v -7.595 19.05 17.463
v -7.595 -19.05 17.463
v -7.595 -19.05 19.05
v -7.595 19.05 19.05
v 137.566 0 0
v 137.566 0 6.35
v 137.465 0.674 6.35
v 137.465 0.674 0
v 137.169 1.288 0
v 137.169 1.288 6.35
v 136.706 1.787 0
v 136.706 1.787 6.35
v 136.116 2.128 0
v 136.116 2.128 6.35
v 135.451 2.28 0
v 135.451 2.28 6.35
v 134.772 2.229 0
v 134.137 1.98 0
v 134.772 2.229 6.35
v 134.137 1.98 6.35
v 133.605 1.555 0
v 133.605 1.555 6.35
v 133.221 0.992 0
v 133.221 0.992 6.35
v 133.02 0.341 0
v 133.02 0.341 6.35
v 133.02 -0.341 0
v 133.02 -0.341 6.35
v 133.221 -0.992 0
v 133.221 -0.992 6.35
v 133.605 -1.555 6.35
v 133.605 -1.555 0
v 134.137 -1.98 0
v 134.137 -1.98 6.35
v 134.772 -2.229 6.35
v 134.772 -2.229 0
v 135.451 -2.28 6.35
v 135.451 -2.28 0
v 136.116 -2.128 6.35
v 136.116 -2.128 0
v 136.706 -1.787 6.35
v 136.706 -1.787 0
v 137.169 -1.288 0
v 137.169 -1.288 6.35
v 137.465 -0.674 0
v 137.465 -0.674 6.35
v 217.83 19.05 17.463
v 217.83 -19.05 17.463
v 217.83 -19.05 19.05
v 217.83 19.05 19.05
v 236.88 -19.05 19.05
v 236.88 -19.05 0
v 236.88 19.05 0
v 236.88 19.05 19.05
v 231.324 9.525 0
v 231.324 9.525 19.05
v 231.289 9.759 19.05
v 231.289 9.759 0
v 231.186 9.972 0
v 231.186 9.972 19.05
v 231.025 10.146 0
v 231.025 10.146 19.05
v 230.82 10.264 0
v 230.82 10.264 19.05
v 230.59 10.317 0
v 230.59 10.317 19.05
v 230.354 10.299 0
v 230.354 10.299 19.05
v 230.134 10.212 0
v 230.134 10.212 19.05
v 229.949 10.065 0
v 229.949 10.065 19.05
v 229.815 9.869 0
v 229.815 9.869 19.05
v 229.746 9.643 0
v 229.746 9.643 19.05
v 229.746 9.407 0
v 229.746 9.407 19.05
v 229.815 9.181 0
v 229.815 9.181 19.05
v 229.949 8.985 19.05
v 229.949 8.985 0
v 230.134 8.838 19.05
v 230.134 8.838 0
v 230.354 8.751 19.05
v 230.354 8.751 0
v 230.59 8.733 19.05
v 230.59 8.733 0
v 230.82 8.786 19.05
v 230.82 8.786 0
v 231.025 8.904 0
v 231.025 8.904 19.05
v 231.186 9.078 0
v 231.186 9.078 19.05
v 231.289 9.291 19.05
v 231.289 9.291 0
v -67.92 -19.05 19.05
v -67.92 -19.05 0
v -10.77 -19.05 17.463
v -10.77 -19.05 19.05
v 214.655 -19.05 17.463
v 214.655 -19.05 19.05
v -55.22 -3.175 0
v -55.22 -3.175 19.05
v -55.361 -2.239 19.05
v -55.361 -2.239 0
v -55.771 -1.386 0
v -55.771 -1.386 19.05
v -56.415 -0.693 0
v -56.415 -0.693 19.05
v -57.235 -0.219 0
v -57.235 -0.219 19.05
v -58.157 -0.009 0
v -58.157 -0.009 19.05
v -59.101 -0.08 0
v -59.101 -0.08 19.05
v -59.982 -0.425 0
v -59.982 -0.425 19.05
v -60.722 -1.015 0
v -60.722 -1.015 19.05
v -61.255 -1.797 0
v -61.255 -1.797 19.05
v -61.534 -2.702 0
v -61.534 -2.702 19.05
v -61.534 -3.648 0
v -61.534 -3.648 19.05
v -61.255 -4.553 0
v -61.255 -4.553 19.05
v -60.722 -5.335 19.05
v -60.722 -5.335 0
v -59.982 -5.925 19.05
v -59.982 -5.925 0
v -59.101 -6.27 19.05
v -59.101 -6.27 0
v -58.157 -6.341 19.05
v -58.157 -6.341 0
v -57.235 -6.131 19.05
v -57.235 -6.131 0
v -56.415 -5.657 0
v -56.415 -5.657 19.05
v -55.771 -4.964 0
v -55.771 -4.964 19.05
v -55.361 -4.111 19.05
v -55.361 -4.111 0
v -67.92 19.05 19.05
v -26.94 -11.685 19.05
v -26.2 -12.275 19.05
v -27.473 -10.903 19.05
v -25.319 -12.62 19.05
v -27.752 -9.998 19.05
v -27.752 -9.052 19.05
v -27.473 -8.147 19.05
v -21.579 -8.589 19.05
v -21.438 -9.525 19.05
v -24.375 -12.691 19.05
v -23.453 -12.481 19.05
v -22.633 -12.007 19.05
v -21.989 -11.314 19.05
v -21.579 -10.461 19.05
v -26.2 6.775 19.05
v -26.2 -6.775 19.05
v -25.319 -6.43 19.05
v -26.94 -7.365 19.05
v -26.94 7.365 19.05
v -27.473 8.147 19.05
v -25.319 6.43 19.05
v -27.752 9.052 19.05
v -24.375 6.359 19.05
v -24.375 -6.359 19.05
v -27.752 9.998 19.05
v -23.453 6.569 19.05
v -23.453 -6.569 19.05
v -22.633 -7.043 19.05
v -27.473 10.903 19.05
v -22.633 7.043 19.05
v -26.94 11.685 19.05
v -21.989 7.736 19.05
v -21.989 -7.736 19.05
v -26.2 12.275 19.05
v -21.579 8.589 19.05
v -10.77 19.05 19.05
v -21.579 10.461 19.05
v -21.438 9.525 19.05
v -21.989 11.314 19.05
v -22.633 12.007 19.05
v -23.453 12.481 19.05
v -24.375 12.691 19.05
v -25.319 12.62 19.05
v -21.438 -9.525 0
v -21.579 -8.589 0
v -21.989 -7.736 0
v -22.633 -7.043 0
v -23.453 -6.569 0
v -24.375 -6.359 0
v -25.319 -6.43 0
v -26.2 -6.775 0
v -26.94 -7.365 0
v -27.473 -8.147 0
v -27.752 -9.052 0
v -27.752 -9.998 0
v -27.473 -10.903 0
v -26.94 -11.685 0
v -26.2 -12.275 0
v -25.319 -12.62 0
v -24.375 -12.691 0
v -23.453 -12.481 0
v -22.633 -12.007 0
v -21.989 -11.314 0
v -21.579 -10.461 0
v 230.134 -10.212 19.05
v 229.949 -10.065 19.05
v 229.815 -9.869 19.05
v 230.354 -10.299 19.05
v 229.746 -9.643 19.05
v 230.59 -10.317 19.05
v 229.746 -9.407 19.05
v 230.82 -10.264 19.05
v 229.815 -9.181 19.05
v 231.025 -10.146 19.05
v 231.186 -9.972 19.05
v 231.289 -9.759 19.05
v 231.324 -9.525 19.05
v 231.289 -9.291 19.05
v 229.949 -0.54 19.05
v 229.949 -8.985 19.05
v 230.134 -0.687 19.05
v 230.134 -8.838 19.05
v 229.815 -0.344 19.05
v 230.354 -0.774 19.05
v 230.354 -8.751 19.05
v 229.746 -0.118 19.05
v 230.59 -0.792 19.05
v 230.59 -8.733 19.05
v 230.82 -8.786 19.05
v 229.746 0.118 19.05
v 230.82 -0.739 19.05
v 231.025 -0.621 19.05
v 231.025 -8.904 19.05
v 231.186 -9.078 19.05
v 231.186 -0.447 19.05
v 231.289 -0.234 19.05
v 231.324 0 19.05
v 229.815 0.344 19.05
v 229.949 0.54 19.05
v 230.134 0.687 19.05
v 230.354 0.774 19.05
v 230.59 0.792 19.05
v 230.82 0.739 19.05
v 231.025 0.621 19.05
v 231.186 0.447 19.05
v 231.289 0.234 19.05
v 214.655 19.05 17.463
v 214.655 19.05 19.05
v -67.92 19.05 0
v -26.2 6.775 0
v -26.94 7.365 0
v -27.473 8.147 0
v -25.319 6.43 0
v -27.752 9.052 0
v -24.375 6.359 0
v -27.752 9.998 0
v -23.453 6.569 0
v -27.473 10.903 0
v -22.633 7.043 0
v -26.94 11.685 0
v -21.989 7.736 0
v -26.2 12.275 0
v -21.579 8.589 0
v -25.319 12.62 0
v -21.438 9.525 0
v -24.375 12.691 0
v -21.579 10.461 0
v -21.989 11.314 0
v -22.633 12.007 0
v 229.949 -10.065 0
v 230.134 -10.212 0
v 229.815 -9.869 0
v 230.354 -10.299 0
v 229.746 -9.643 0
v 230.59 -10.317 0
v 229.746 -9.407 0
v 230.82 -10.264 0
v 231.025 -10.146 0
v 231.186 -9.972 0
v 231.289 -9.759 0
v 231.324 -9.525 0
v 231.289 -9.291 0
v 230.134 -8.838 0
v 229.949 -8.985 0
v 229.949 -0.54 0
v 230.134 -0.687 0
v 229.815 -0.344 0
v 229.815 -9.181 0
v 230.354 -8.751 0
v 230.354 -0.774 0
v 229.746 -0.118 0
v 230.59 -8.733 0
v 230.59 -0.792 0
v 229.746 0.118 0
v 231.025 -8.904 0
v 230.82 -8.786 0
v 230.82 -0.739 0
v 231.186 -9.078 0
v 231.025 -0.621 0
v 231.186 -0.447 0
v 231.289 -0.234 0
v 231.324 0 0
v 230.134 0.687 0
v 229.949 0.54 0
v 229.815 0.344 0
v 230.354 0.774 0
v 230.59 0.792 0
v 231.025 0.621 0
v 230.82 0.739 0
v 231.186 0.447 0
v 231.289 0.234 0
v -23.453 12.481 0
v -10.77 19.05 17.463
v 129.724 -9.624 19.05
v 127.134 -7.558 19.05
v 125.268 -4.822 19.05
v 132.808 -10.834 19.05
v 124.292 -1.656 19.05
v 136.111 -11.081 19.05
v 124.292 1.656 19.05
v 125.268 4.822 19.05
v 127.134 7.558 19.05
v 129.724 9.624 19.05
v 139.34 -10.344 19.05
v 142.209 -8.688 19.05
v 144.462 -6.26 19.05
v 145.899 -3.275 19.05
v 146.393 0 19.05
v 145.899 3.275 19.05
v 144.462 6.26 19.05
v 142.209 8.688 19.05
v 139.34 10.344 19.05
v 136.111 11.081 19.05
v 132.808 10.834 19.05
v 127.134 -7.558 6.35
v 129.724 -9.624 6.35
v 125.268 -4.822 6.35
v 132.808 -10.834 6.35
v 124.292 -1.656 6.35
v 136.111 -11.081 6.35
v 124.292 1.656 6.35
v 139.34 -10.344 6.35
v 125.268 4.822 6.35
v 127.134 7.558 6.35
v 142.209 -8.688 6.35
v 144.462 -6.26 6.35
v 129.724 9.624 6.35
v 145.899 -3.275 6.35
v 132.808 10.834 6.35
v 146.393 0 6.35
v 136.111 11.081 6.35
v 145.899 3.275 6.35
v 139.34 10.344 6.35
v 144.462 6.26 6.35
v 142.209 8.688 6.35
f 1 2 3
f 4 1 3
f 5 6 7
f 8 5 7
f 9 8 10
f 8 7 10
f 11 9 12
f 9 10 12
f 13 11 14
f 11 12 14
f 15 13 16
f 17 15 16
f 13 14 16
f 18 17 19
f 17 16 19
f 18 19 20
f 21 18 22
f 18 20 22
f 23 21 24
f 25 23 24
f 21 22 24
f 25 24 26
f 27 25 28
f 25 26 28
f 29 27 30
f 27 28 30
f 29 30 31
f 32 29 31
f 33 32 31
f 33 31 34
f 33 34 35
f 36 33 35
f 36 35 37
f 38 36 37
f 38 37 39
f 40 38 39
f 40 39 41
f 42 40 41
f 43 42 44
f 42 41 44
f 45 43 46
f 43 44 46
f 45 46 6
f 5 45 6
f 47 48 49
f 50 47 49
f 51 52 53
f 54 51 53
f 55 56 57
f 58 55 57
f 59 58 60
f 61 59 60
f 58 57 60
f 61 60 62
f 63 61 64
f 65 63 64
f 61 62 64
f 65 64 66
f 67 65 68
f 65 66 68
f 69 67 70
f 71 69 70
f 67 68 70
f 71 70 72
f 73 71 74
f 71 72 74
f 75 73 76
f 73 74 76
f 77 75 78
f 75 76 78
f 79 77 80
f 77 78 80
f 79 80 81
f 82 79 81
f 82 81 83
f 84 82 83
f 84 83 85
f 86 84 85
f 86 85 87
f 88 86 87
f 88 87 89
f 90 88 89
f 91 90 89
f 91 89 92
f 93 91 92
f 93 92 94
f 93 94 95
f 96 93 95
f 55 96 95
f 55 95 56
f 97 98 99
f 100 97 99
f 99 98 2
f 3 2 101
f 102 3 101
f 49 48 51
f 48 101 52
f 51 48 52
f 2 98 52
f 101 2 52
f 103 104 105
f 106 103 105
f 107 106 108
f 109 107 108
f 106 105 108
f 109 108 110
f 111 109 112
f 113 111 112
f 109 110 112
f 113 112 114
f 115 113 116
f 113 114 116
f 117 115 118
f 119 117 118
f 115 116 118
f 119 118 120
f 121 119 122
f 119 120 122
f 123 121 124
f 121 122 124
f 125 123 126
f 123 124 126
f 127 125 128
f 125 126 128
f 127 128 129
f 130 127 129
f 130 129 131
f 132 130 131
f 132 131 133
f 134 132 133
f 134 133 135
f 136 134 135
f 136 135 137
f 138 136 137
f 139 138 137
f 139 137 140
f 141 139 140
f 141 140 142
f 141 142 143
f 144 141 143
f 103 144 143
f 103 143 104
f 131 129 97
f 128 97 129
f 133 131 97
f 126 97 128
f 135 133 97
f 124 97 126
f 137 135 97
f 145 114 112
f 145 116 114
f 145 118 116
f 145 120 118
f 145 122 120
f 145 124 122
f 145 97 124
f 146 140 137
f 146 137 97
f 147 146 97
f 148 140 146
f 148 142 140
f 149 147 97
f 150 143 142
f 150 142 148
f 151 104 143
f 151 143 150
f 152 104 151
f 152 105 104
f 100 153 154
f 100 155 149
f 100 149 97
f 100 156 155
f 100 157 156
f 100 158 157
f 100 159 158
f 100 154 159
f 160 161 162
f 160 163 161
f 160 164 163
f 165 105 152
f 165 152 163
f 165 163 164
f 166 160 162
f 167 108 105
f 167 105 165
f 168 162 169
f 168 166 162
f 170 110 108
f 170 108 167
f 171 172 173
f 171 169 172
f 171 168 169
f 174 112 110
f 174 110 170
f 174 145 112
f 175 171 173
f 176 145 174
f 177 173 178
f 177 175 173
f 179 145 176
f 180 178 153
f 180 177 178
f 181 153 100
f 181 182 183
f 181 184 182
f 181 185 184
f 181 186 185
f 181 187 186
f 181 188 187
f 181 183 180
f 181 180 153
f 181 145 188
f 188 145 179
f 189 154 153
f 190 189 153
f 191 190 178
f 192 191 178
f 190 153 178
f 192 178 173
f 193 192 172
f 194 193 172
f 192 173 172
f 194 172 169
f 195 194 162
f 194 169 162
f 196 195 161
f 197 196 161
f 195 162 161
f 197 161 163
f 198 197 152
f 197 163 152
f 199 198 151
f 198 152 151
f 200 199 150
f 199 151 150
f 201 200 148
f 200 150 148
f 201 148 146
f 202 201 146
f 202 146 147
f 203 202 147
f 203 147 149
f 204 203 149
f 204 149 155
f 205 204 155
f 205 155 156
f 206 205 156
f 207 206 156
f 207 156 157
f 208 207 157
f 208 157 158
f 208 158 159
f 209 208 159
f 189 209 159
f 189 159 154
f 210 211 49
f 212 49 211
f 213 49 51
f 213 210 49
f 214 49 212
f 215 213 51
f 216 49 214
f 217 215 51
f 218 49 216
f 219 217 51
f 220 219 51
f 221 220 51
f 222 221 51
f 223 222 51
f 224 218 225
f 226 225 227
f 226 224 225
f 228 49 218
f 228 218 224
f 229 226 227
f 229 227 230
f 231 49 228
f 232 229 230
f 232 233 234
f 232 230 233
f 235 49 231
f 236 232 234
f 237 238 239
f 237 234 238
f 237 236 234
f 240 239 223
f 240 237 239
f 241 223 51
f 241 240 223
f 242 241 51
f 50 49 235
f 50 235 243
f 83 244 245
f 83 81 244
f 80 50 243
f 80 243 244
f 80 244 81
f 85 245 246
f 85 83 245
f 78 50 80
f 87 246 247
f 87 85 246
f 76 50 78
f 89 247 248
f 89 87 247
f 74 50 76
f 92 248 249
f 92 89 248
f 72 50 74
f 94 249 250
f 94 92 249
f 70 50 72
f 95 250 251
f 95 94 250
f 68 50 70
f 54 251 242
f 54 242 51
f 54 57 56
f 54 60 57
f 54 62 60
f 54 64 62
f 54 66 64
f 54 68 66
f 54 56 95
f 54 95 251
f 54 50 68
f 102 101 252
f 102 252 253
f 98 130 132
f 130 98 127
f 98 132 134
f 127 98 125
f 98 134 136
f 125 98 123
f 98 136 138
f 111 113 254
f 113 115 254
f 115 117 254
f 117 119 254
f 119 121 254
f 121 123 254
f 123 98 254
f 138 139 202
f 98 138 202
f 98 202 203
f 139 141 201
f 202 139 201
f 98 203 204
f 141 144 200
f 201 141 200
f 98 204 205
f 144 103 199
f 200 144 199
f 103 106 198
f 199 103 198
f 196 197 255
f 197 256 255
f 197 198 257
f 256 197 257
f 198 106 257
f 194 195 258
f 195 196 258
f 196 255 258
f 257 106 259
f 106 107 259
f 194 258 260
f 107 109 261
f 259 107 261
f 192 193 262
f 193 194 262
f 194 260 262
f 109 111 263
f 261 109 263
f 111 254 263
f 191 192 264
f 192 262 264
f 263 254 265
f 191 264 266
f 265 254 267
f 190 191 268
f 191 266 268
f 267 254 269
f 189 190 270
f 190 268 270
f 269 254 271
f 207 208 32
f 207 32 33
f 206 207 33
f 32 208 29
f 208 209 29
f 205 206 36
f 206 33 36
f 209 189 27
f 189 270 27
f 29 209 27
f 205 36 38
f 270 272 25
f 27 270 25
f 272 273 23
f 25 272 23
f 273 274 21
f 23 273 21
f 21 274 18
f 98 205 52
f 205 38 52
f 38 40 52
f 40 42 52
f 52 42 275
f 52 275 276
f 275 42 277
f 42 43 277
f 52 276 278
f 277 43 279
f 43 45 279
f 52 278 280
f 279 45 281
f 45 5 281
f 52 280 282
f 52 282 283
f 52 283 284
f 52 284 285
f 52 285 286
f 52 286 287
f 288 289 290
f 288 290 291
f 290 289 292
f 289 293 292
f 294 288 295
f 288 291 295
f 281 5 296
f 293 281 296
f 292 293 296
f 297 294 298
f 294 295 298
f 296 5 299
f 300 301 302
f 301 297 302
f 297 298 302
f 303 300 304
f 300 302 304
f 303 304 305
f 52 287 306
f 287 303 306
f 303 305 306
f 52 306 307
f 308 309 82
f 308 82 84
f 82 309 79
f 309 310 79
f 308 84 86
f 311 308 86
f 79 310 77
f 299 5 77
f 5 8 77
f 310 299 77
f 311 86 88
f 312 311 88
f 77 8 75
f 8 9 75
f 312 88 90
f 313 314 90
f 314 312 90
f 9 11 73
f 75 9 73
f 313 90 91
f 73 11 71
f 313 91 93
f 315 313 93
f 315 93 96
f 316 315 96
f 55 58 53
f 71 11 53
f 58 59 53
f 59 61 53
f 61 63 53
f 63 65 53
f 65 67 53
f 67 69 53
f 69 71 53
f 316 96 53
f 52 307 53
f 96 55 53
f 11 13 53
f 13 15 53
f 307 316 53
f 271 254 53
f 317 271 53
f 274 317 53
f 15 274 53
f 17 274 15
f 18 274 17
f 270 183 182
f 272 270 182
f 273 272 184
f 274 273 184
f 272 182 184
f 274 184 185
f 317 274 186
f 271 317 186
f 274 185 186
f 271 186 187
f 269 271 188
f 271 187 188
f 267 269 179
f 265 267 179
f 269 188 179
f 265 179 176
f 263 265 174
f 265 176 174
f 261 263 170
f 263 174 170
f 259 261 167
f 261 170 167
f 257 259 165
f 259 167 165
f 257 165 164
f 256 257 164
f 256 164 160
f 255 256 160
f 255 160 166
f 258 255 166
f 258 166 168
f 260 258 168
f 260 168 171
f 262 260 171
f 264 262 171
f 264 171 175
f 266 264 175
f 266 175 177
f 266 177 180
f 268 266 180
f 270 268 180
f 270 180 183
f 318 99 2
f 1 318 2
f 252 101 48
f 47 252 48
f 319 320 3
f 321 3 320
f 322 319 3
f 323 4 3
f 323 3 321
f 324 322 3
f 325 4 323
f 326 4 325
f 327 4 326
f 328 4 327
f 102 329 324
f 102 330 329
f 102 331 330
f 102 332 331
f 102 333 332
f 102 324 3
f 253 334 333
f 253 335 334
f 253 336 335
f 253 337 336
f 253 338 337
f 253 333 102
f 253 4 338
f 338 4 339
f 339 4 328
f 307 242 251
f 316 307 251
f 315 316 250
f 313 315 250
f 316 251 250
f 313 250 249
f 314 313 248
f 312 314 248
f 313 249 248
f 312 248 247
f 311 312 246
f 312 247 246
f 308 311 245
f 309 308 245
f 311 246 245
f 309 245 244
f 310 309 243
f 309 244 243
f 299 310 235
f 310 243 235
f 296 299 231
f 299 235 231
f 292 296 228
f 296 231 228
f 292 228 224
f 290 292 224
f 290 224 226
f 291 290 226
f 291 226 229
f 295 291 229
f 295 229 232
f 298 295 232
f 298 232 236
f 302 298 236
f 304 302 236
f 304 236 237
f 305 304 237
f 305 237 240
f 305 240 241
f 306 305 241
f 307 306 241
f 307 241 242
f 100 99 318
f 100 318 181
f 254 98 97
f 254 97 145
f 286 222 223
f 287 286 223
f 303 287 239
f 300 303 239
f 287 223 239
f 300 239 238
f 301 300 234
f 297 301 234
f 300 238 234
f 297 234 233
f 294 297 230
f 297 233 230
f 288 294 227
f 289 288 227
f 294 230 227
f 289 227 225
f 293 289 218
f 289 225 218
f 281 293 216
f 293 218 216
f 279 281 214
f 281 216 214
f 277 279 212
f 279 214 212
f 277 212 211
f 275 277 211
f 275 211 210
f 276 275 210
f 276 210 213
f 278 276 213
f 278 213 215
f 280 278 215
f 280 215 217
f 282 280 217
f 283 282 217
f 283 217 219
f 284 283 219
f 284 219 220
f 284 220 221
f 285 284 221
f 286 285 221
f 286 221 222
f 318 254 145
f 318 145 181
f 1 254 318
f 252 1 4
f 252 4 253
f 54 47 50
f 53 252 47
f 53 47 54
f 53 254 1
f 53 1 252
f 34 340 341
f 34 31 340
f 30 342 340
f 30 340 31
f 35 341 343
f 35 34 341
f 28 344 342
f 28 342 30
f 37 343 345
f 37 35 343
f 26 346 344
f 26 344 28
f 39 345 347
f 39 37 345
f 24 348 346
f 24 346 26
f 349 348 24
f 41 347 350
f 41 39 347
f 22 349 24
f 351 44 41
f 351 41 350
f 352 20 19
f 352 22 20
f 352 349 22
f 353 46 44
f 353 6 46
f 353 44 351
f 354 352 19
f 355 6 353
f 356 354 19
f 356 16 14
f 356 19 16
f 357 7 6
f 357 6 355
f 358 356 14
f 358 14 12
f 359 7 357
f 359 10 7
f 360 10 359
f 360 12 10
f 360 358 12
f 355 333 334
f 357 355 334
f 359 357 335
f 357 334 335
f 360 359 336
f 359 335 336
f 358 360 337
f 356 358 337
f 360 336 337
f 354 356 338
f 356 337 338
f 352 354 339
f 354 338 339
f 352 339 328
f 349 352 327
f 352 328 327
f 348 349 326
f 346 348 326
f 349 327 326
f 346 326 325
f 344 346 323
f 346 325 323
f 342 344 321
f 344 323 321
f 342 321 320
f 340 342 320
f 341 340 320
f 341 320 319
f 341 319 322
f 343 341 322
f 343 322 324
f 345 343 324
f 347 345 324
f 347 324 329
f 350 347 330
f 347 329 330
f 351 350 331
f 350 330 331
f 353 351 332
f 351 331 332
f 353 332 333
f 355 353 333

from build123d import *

# Parameters (mm, degrees)
F0_W      = 304.8
F0_H      = 38.1
F1_DEPTH  = 19.05
F2_R      = 11.1125
F3_DEPTH  = 12.7
F4_R      = 3.175
F5_DEPTH  = 19.051
F6_R      = 3.175
F7_DEPTH  = 19.051
F8_R      = 0.79375
F9_DEPTH  = 19.051
F10_W     = 3.175
F10_H     = 1.5875
F11_DEPTH = 38.101
F12_R     = 2.286
F13_DEPTH = 6.35


with BuildPart() as f1:
    # F0 (on Top) → F1 (new body)
    with BuildSketch(Plane.XY):
        with Locations((84.480461, 0)):
            Rectangle(F0_W, F0_H)
    extrude(amount=F1_DEPTH)

    # F2 (on face) → F3 (cut)
    with BuildSketch(Plane.XY.offset(19.05)):
        with Locations((135.280461, 0)):
            Circle(F2_R)
    extrude(amount=-F3_DEPTH, mode=Mode.SUBTRACT)

    # F4 (on face) → F5 (cut, through all)
    with BuildSketch(Plane.XY.offset(19.05)):
        with Locations((-58.394539, -3.175)):
            Circle(F4_R)
    extrude(amount=-F5_DEPTH, mode=Mode.SUBTRACT)

    # F6 (on face) → F7 (cut, through all)
    with BuildSketch(Plane.XY.offset(19.05)):
        with Locations((-24.612539, -9.525)):
            Circle(F6_R)
        with Locations((-24.612539, 9.525)):
            Circle(F6_R)
    extrude(amount=-F7_DEPTH, mode=Mode.SUBTRACT)

    # F8 (on face) → F9 (cut, through all)
    with BuildSketch(Plane.XY.offset(19.05)):
        with Locations((230.530461, 9.525)):
            Circle(F8_R)
        with Locations((230.530461, 0)):
            Circle(F8_R)
        with Locations((230.530461, -9.525)):
            Circle(F8_R)
    extrude(amount=-F9_DEPTH, mode=Mode.SUBTRACT)

    # F10 (on face) → F11 (cut, through all)
    with BuildSketch(Plane.XZ.offset(19.05)):
        with Locations((-9.182039, 18.25625)):
            Rectangle(F10_W, F10_H)
        with Locations((216.242961, 18.25625)):
            Rectangle(F10_W, F10_H)
    extrude(amount=-F11_DEPTH, mode=Mode.SUBTRACT)

    # F12 (on face) → F13 (cut, through all)
    with BuildSketch(Plane.XY.offset(6.35)):
        with Locations((135.280461, 0)):
            Circle(F12_R)
    extrude(amount=-F13_DEPTH, mode=Mode.SUBTRACT)


solid = f1.part
